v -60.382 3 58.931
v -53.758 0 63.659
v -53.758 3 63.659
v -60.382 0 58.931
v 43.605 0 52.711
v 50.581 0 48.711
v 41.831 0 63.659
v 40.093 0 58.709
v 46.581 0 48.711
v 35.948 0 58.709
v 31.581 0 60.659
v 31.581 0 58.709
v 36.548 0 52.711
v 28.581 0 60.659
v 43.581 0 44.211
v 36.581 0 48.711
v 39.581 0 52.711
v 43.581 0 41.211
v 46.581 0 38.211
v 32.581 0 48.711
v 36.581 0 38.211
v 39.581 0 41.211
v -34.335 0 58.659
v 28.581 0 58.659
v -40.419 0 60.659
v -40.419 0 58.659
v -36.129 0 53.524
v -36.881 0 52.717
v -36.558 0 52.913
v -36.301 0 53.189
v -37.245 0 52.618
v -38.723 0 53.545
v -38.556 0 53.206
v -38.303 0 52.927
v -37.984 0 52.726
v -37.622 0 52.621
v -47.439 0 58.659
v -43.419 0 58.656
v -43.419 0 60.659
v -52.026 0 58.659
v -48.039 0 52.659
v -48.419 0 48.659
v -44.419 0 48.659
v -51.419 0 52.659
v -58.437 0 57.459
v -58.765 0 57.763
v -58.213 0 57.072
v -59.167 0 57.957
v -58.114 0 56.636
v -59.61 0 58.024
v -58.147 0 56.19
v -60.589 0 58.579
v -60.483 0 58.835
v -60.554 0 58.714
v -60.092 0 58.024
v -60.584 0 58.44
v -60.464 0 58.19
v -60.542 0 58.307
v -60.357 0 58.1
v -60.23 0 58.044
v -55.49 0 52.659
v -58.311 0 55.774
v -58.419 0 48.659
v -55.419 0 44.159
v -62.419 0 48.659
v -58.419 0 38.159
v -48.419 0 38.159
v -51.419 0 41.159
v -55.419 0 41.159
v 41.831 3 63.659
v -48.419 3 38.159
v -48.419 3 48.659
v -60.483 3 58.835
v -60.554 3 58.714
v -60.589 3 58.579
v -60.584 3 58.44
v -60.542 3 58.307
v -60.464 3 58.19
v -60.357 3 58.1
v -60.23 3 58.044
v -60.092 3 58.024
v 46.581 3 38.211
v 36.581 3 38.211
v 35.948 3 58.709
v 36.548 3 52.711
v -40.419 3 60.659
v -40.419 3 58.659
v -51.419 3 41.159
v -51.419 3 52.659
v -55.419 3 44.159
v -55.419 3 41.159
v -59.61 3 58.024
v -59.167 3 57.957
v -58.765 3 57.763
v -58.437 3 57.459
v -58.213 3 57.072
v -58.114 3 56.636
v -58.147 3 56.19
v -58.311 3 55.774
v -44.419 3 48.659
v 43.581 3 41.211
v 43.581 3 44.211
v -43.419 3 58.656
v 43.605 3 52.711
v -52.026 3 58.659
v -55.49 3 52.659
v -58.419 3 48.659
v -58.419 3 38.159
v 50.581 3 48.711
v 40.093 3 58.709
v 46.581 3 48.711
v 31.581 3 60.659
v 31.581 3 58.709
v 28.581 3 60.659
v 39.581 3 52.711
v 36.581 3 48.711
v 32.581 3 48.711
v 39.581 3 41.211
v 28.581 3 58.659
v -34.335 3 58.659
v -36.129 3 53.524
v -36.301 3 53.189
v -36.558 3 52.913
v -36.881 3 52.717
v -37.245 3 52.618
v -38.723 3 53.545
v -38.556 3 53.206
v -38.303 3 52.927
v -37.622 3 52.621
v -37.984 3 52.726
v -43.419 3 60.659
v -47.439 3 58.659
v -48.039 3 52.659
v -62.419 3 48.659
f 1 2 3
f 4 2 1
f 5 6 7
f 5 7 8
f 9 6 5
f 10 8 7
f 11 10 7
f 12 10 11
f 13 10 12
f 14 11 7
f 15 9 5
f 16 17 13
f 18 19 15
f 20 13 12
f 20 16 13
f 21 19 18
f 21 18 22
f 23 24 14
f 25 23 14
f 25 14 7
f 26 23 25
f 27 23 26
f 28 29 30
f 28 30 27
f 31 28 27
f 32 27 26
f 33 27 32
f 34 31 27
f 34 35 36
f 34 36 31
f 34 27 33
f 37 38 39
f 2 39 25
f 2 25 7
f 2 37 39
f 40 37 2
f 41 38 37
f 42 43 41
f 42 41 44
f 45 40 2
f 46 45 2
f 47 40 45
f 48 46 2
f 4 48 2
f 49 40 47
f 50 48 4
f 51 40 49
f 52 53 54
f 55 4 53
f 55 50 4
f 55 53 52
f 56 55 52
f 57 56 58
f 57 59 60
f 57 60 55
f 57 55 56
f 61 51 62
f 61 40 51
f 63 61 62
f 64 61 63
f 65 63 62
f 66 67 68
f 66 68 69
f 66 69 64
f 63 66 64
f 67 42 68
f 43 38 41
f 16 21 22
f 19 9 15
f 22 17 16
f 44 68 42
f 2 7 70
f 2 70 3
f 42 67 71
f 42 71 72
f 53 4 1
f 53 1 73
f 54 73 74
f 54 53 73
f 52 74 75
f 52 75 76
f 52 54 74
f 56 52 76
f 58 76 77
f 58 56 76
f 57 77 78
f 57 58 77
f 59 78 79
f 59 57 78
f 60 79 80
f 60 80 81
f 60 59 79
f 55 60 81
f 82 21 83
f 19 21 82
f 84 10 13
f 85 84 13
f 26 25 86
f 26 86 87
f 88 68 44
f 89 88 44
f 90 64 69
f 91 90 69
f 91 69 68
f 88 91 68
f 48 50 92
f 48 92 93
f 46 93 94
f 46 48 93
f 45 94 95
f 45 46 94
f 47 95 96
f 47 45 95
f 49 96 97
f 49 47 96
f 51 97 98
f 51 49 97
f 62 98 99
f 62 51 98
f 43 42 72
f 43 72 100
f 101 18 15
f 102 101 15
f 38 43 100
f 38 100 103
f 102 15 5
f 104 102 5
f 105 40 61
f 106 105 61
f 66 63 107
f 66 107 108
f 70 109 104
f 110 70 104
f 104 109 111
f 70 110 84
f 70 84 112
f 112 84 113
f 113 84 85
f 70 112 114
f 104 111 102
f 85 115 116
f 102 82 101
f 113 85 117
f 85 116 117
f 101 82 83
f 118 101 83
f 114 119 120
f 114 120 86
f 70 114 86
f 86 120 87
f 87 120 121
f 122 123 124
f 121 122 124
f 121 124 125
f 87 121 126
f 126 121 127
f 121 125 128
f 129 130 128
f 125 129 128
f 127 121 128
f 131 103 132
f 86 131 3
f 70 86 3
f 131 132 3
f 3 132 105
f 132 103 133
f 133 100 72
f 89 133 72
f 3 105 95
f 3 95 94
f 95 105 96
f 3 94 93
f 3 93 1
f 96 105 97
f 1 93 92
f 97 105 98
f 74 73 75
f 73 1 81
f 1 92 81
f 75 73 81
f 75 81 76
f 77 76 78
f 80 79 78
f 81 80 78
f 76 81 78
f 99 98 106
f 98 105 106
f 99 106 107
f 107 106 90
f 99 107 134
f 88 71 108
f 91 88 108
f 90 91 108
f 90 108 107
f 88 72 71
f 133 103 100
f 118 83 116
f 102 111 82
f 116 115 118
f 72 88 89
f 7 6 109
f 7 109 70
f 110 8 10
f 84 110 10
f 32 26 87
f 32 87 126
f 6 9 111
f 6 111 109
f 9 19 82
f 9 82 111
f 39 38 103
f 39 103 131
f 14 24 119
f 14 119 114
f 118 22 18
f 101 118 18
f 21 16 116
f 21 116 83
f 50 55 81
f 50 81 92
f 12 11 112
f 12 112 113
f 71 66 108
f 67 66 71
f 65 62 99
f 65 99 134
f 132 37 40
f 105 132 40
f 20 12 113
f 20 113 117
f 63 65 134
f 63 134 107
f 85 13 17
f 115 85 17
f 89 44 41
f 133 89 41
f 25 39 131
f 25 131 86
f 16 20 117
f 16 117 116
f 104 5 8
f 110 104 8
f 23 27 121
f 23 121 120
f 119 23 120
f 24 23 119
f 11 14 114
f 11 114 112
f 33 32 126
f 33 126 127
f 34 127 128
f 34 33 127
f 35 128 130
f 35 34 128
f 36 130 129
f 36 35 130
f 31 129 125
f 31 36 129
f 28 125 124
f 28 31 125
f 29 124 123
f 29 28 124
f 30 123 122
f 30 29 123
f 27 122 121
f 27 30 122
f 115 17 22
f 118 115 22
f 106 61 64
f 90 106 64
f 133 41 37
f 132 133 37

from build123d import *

# Parameters (mm, degrees)
BOSS_EXTRUDE1_DEPTH = 3


with BuildPart() as part:
    # Sketch1 → Boss-Extrude1 (new body)
    with BuildSketch(Plane(origin=(0, 0, 0), x_dir=(1, 0, 0), z_dir=(0, 1, 0))):
        with BuildLine():
            Line((-62.418566214, -48.6586621), (-58.418566214, -48.6586621))
            Line((-58.418566214, -48.6586621), (-58.418566214, -38.1586621))
            Line((-58.418566214, -38.1586621), (-48.418566214, -38.1586621))
            Line((-48.418566214, -38.1586621), (-48.418566214, -48.6586621))
            Line((-48.418566214, -48.6586621), (-44.418566214, -48.6586621))
            Line((-44.418566214, -48.6586621), (-43.418817081, -58.656153425))
            Line((-43.418817081, -58.656153425), (-43.418817081, -60.6586621))
            Line((-43.418817081, -60.6586621), (-40.418817081, -60.6586621))
            Line((-40.418817081, -60.6586621), (-40.418817081, -58.6586621))
            Line((-40.418817081, -58.6586621), (-38.722684913, -53.544656797))
            ThreePointArc((-38.722684913, -53.544656797), (-37.43326006, -52.606013311), (-36.129099744, -53.524073178))
            Line((-36.129099744, -53.524073178), (-34.335191263, -58.6586621))
            Line((-34.335191263, -58.6586621), (28.581433786, -58.6586621))
            Line((28.581433786, -58.6586621), (28.581433786, -60.6586621))
            Line((28.581433786, -60.6586621), (31.581433786, -60.6586621))
            Line((31.581433786, -60.6586621), (31.581433786, -58.708800497))
            Line((31.581433786, -58.708800497), (32.581433786, -48.711334262))
            Line((32.581433786, -48.711334262), (36.581433786, -48.711334262))
            Line((36.581433786, -48.711334262), (36.581433786, -38.211334262))
            Line((36.581433786, -38.211334262), (46.581433786, -38.211334262))
            Line((46.581433786, -38.211334262), (46.581433786, -48.711334262))
            Line((46.581433786, -48.711334262), (50.581433786, -48.711334262))
            Line((50.581433786, -48.711334262), (41.830582941, -63.6586621))
            Line((41.830582941, -63.6586621), (-53.758312176, -63.6586621))
            Line((-53.758312176, -63.6586621), (-60.382083638, -58.930990881))
            ThreePointArc((-60.382083638, -58.930990881), (-60.567785948, -58.371516574), (-60.091610782, -58.024019727))
            Line((-60.091610782, -58.024019727), (-59.609550678, -58.024019727))
            ThreePointArc((-59.609550678, -58.024019727), (-58.310512573, -57.274019727), (-58.310512573, -55.774019727))
            Line((-58.310512573, -55.774019727), (-62.418566214, -48.6586621))
        make_face()
        Polygon((36.547763078, -52.711334262), (39.581433786, -52.711334262), (39.581433786, -44.211334262), (39.581433786, -41.211334262), (43.581433786, -41.211334262), (43.581433786, -44.211334262), (43.604572315, -52.711334262), (40.093380681, -58.708800497), (35.947864455, -58.708800497), align=None, mode=Mode.SUBTRACT)
        Polygon((-55.418566214, -41.1586621), (-51.418566214, -41.1586621), (-51.418566214, -44.1586621), (-51.418566214, -52.6586621), (-48.038516462, -52.6586621), (-47.438516462, -58.6586621), (-52.026261368, -58.6586621), (-55.490362984, -52.6586621), (-55.418566214, -44.1586621), align=None, mode=Mode.SUBTRACT)
    extrude(amount=BOSS_EXTRUDE1_DEPTH)


solid = part.part
